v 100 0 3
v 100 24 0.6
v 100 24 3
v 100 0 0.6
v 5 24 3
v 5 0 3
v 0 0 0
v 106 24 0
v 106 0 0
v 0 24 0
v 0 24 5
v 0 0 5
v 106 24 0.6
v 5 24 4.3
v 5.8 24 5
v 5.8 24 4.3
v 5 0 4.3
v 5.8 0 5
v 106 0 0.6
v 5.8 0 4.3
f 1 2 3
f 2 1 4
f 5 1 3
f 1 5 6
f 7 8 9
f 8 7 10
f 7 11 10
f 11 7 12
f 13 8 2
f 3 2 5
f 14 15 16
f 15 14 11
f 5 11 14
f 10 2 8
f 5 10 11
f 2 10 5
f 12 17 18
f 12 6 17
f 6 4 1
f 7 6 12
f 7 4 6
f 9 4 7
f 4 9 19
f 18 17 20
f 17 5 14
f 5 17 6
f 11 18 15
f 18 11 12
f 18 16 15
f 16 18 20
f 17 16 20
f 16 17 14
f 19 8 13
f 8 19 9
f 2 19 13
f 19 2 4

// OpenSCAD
/* Bag clip with living hinge - PETG, 0.4mm nozzle, no supports
   Printed open flat (single print, fuses into one piece), folds shut on 2mm folded bag.
   Two verification parts (lower + upper) that fuse at hinge when printed together.
   Assembly shows closed on bag, motion "closing" folds upper onto lower/bag.
*/
/* [Print] */
part = "lower"; // [lower, upper, assembly]

cadverify_only = "";
module instance(name, part, unit = 1) {
    echo(cadverify_instance = [name, part, unit]);
    if (cadverify_only == "" || cadverify_only == name) children();
}

// ---- parameters (mm) ----
arm_len = 100;
arm_w = 24;
arm_t = 3;
hinge_len = 6;
hinge_t = 0.6;
tab_len = 12;
heel_len = 8;
catch_w = 5;
lip = 0.8;
lip_t = 0.7;
bag_t = 2;

lower_xmax = 106;      // 0..106
upper_len_print = 112; // 0..112
closed_h = 8.2;
pivot_x = 103.05;
pivot_z = 4.1;

module lower_geo() {
    // base
    cube([100, arm_w, arm_t]);
    // catch block at free end (x 0..5), overlap into base
    translate([0, 0, 2.98]) cube([5, arm_w, 2.02]);
    // catch lip protruding +x, overlap into block
    translate([4.98, 0, 4.3]) cube([0.82, arm_w, 0.7]);
    // living hinge leaf, overlap into base
    translate([99.98, 0, 0]) cube([6.02, arm_w, hinge_t]);
}

module upper_geo() {
    // base 0..100
    cube([100, arm_w, arm_t]);
    // heel at hinge end on top
    translate([0, 0, 2.98]) cube([8, arm_w, 2.02]);
    // hook leg near free end on top
    translate([92.2, 0, 2.98]) cube([2, arm_w, 1.82]);
    // hook lip protruding +x from leg side
    translate([94.18, 0, 4.1]) cube([0.82, arm_w, 0.7]);
    // thumb tab extension beyond free end
    translate([99.98, 0, 0]) cube([12.02, arm_w, arm_t]);
}

module bag_geo() {
    translate([8, 0, 3]) cube([84, arm_w, bag_t]);
}

if (part == "lower") {
    echo(cadverify_spec = [
        ["bounds", [[0, 0, 0], [106, 24, 5]]],
        ["bodies", 1],
        ["through_holes", 0],
        ["support_faces", [["bed", "-z", 500]]],
        ["overhangs_allowed", [["catch lip bridge", [[4.5, 0, 4.0], [6.2, 24, 5.1]]]]],
        ["copies", 1],
        ["details", [
            ["base", "material", [[10, 0, 0], [90, 24, 3]], 1],
            ["catch", "material", [[0, 0, 3], [5, 24, 5]], 1],
            ["catch_lip", "material", [[4.98, 0, 4.3], [5.8, 24, 5]], 1],
            ["hinge", "material", [[99.98, 0, 0], [106, 24, 0.6]], 1],
            ["hook_space", "void", [[5.8, 0, 3], [8.6, 24, 5.4]], 1],
            ["bag_space", "void", [[8, 0, 5.1], [92, 24, 7]], 1],
            ["wall", "thickness", [50, 12, 6], [0, 0, -1], 3],
            ["film", "thickness", [103, 12, 2], [0, 0, -1], 0.6],
            ["hinge_top", "view", [[99, 0, 0], [107, 24, 1]]]
        ]]
    ]);
    lower_geo();
} else if (part == "upper") {
    echo(cadverify_spec = [
        ["bounds", [[0, 0, 0], [112, 24, 5]]],
        ["bodies", 1],
        ["through_holes", 0],
        ["support_faces", [["bed", "-z", 500]]],
        ["overhangs_allowed", [["hook lip bridge", [[91.5, 0, 2.8], [96, 24, 5]]]]],
        ["copies", 1],
        ["details", [
            ["heel", "material", [[0, 0, 3], [8, 24, 5]], 1],
            ["arm", "material", [[10, 0, 0], [80, 24, 3]], 1],
            ["hook_leg", "material", [[92.2, 0, 3], [94.2, 24, 4.8]], 1],
            ["hook_lip", "material", [[94.18, 0, 4.1], [95, 24, 4.8]], 1],
            ["tab", "material", [[100, 0, 0], [112, 24, 3]], 1],
            ["catch_space", "void", [[95, 0, 3], [99.9, 24, 5]], 1],
            ["wall", "thickness", [50, 12, 6], [0, 0, -1], 3],
            ["heel_wall", "thickness", [4, 12, 7], [0, 0, -1], 5],
            ["thumb", "view", [[99, 0, 0], [113, 24, 3.5]]]
        ]]
    ]);
    upper_geo();
} else if (part == "assembly") {
    echo(cadverify_spec = [
        ["bounds", [[-12, 0, 0], [106, 24, 8.2]]],
        ["support_faces", [["bed", "-z", 1000]]],
        ["motions", [
            ["closing", ["upper"], "rotate", [103.05, 12, 4.1], [0, 1, 0], [0, 180],
                ["flex", [["upper", "lower", 1, "latch snap and heel clearance"]]]]
        ]],
        ["assembly_order", [
            [[["lower"], [0, 0, 0]]],
            [[["bag"], [0, 0, -1]]],
            [[["upper"], [0, 0, -1], ["flex", [["upper", "lower", 1, "latch snap"]]]]]
        ]]
    ]);
    instance("lower", "lower") lower_geo();
    instance("upper", "upper") translate([100, 0, 8.2]) rotate([0, 180, 0]) upper_geo();
    instance("bag", "external") bag_geo();
}
